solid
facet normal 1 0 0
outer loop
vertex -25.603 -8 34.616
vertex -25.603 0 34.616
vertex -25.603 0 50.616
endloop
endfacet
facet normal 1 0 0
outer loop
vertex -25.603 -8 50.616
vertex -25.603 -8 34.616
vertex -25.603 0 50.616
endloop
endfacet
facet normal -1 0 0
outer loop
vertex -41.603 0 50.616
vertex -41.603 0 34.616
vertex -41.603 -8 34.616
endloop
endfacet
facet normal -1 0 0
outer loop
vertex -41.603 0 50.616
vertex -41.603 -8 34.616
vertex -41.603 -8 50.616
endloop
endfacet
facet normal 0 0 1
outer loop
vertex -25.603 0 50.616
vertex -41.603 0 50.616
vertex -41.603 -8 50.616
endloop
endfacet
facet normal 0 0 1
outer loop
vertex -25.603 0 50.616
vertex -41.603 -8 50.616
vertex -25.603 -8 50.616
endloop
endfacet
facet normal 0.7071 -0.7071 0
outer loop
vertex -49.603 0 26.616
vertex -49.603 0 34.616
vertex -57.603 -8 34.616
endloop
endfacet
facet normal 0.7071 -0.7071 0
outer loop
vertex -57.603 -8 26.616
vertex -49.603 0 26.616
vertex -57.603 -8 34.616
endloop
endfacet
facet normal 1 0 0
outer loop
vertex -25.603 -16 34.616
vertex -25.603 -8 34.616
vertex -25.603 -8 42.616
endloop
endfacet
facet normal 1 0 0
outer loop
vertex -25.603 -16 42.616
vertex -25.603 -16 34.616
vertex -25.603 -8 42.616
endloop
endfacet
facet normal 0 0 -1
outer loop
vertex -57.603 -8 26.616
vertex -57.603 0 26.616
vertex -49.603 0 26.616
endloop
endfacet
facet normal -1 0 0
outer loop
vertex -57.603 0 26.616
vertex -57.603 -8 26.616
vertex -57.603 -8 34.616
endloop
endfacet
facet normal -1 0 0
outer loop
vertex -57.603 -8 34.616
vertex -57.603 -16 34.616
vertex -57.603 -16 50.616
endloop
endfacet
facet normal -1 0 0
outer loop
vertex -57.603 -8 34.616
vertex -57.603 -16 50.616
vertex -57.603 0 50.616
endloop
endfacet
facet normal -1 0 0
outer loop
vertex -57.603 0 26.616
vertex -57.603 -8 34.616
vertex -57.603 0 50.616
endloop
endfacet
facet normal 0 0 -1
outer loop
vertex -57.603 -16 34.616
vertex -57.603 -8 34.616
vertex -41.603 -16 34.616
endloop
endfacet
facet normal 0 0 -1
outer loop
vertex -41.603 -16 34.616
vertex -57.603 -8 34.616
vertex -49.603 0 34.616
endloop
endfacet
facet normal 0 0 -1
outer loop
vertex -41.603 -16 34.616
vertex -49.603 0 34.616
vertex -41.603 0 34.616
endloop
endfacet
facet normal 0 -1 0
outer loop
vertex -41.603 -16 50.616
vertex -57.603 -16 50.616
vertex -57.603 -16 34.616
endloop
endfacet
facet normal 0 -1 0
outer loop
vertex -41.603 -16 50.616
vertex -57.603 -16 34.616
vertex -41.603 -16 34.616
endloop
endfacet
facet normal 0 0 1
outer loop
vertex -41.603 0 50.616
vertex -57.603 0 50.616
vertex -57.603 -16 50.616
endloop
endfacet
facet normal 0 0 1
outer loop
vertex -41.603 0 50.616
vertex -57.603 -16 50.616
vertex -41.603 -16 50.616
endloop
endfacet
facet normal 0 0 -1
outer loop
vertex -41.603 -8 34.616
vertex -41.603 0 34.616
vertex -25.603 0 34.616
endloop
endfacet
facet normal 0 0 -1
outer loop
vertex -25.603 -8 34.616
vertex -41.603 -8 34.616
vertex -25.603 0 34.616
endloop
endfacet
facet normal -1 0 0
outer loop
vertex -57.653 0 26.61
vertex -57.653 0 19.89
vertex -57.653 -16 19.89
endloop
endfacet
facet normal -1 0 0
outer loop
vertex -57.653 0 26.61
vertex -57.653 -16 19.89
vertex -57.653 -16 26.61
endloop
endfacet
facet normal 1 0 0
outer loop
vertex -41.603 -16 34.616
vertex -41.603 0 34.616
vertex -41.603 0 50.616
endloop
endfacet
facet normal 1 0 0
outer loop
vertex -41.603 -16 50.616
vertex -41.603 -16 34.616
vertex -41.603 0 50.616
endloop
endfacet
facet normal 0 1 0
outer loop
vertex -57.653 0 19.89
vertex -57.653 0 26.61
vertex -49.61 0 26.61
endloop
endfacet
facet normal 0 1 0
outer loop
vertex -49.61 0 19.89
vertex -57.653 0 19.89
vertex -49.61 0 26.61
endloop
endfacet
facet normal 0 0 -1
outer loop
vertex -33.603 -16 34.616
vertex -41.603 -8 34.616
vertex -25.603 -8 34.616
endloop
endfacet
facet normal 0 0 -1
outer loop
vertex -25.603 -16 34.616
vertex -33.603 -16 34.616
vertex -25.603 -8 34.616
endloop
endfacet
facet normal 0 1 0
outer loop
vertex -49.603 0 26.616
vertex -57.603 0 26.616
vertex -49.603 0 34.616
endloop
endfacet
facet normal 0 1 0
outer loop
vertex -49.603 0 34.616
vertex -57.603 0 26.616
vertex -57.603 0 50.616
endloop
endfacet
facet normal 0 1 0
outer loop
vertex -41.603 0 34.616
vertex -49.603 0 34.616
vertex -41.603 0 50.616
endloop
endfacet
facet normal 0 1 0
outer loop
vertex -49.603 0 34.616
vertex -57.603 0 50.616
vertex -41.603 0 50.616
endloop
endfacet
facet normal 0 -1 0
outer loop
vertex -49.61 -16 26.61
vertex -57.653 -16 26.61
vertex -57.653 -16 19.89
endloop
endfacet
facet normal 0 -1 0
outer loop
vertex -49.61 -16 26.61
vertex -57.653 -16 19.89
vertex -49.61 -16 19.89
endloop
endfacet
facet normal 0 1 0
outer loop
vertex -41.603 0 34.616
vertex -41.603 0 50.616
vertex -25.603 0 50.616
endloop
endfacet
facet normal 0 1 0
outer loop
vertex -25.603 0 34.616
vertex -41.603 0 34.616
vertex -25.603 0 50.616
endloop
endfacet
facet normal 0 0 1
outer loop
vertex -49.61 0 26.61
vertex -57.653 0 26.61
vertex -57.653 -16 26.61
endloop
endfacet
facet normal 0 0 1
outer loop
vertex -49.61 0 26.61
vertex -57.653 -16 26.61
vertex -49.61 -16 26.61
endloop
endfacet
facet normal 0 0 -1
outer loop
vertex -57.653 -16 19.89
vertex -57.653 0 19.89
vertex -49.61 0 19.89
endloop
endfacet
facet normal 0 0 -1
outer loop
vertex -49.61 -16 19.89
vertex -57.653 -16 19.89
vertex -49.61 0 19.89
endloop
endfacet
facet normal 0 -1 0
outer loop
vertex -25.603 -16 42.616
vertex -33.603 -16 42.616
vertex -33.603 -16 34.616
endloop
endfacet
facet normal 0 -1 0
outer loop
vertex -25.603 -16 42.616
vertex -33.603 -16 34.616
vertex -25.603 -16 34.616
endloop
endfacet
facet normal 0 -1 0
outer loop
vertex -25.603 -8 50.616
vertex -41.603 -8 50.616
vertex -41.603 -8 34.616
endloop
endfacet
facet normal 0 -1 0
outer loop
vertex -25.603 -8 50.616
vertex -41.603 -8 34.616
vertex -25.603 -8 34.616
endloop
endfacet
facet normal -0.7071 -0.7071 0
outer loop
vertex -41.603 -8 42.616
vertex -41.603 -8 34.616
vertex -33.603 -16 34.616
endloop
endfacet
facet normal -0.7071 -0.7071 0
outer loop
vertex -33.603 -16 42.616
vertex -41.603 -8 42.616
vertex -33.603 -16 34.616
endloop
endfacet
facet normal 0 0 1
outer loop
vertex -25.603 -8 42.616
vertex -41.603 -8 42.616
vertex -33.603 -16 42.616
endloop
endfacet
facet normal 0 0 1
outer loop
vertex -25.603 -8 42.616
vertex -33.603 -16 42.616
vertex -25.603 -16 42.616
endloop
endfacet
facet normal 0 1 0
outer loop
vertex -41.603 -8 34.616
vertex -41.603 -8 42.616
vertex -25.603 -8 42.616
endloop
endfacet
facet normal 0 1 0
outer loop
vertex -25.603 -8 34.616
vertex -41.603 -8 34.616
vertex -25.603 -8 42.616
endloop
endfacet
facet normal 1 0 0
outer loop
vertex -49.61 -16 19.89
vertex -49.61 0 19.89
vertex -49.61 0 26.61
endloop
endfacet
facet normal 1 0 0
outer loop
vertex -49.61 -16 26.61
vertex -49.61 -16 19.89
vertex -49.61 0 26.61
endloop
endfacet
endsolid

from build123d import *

# Parameters (mm, degrees)
F0_W      = 16
F0_H      = 16
F1_DEPTH  = 8
F2_DEPTH  = 16
F3_W      = 16
F3_H      = 8
F4_DEPTH  = 8
F6_DEPTH  = 8
F8_DEPTH  = 8
F9_W      = 8.043356
F9_H      = 6.719346
F10_DEPTH = 16


with BuildPart() as f1:
    # F0 (on Front) → F1 (new body)
    with BuildSketch(Plane.XZ):
        with Locations((-33.602594, 42.616238)):
            Rectangle(F0_W, F0_H)
    extrude(amount=F1_DEPTH)


with BuildPart() as f2:
    # F0 (on Front) → F2 (new body)
    with BuildSketch(Plane.XZ):
        with Locations((-49.602594, 42.616238)):
            Rectangle(F0_W, F0_H)
    extrude(amount=F2_DEPTH)

    # F7 (on face) → F8 (join)
    with BuildSketch(Plane(origin=(0, 0, 34.616238), x_dir=(1, 0, 0), z_dir=(0, 0, -1))):
        Polygon((-49.602594, 0), (-57.602594, 8), (-57.602594, 0), align=None)
    extrude(amount=F8_DEPTH)


with BuildPart() as f4:
    # F3 (on face) → F4 (new body)
    with BuildSketch(Plane.XZ.offset(8)):
        with Locations((-33.602594, 38.616238)):
            Rectangle(F3_W, F3_H)
    extrude(amount=F4_DEPTH)

    # F5 (on face) → F6 (cut)
    with BuildSketch(Plane(origin=(0, 0, 34.616238), x_dir=(1, 0, 0), z_dir=(0, 0, -1))):
        Polygon((-41.602594, 8), (-33.602594, 16), (-41.602594, 16), align=None)
    extrude(amount=-F6_DEPTH, mode=Mode.SUBTRACT)


with BuildPart() as f10:
    # F9 (on Front) → F10 (new body)
    with BuildSketch(Plane.XZ):
        with Locations((-53.631585, 23.250115)):
            Rectangle(F9_W, F9_H)
    extrude(amount=F10_DEPTH)


solid = Compound([f1.part, f2.part, f4.part, f10.part])
